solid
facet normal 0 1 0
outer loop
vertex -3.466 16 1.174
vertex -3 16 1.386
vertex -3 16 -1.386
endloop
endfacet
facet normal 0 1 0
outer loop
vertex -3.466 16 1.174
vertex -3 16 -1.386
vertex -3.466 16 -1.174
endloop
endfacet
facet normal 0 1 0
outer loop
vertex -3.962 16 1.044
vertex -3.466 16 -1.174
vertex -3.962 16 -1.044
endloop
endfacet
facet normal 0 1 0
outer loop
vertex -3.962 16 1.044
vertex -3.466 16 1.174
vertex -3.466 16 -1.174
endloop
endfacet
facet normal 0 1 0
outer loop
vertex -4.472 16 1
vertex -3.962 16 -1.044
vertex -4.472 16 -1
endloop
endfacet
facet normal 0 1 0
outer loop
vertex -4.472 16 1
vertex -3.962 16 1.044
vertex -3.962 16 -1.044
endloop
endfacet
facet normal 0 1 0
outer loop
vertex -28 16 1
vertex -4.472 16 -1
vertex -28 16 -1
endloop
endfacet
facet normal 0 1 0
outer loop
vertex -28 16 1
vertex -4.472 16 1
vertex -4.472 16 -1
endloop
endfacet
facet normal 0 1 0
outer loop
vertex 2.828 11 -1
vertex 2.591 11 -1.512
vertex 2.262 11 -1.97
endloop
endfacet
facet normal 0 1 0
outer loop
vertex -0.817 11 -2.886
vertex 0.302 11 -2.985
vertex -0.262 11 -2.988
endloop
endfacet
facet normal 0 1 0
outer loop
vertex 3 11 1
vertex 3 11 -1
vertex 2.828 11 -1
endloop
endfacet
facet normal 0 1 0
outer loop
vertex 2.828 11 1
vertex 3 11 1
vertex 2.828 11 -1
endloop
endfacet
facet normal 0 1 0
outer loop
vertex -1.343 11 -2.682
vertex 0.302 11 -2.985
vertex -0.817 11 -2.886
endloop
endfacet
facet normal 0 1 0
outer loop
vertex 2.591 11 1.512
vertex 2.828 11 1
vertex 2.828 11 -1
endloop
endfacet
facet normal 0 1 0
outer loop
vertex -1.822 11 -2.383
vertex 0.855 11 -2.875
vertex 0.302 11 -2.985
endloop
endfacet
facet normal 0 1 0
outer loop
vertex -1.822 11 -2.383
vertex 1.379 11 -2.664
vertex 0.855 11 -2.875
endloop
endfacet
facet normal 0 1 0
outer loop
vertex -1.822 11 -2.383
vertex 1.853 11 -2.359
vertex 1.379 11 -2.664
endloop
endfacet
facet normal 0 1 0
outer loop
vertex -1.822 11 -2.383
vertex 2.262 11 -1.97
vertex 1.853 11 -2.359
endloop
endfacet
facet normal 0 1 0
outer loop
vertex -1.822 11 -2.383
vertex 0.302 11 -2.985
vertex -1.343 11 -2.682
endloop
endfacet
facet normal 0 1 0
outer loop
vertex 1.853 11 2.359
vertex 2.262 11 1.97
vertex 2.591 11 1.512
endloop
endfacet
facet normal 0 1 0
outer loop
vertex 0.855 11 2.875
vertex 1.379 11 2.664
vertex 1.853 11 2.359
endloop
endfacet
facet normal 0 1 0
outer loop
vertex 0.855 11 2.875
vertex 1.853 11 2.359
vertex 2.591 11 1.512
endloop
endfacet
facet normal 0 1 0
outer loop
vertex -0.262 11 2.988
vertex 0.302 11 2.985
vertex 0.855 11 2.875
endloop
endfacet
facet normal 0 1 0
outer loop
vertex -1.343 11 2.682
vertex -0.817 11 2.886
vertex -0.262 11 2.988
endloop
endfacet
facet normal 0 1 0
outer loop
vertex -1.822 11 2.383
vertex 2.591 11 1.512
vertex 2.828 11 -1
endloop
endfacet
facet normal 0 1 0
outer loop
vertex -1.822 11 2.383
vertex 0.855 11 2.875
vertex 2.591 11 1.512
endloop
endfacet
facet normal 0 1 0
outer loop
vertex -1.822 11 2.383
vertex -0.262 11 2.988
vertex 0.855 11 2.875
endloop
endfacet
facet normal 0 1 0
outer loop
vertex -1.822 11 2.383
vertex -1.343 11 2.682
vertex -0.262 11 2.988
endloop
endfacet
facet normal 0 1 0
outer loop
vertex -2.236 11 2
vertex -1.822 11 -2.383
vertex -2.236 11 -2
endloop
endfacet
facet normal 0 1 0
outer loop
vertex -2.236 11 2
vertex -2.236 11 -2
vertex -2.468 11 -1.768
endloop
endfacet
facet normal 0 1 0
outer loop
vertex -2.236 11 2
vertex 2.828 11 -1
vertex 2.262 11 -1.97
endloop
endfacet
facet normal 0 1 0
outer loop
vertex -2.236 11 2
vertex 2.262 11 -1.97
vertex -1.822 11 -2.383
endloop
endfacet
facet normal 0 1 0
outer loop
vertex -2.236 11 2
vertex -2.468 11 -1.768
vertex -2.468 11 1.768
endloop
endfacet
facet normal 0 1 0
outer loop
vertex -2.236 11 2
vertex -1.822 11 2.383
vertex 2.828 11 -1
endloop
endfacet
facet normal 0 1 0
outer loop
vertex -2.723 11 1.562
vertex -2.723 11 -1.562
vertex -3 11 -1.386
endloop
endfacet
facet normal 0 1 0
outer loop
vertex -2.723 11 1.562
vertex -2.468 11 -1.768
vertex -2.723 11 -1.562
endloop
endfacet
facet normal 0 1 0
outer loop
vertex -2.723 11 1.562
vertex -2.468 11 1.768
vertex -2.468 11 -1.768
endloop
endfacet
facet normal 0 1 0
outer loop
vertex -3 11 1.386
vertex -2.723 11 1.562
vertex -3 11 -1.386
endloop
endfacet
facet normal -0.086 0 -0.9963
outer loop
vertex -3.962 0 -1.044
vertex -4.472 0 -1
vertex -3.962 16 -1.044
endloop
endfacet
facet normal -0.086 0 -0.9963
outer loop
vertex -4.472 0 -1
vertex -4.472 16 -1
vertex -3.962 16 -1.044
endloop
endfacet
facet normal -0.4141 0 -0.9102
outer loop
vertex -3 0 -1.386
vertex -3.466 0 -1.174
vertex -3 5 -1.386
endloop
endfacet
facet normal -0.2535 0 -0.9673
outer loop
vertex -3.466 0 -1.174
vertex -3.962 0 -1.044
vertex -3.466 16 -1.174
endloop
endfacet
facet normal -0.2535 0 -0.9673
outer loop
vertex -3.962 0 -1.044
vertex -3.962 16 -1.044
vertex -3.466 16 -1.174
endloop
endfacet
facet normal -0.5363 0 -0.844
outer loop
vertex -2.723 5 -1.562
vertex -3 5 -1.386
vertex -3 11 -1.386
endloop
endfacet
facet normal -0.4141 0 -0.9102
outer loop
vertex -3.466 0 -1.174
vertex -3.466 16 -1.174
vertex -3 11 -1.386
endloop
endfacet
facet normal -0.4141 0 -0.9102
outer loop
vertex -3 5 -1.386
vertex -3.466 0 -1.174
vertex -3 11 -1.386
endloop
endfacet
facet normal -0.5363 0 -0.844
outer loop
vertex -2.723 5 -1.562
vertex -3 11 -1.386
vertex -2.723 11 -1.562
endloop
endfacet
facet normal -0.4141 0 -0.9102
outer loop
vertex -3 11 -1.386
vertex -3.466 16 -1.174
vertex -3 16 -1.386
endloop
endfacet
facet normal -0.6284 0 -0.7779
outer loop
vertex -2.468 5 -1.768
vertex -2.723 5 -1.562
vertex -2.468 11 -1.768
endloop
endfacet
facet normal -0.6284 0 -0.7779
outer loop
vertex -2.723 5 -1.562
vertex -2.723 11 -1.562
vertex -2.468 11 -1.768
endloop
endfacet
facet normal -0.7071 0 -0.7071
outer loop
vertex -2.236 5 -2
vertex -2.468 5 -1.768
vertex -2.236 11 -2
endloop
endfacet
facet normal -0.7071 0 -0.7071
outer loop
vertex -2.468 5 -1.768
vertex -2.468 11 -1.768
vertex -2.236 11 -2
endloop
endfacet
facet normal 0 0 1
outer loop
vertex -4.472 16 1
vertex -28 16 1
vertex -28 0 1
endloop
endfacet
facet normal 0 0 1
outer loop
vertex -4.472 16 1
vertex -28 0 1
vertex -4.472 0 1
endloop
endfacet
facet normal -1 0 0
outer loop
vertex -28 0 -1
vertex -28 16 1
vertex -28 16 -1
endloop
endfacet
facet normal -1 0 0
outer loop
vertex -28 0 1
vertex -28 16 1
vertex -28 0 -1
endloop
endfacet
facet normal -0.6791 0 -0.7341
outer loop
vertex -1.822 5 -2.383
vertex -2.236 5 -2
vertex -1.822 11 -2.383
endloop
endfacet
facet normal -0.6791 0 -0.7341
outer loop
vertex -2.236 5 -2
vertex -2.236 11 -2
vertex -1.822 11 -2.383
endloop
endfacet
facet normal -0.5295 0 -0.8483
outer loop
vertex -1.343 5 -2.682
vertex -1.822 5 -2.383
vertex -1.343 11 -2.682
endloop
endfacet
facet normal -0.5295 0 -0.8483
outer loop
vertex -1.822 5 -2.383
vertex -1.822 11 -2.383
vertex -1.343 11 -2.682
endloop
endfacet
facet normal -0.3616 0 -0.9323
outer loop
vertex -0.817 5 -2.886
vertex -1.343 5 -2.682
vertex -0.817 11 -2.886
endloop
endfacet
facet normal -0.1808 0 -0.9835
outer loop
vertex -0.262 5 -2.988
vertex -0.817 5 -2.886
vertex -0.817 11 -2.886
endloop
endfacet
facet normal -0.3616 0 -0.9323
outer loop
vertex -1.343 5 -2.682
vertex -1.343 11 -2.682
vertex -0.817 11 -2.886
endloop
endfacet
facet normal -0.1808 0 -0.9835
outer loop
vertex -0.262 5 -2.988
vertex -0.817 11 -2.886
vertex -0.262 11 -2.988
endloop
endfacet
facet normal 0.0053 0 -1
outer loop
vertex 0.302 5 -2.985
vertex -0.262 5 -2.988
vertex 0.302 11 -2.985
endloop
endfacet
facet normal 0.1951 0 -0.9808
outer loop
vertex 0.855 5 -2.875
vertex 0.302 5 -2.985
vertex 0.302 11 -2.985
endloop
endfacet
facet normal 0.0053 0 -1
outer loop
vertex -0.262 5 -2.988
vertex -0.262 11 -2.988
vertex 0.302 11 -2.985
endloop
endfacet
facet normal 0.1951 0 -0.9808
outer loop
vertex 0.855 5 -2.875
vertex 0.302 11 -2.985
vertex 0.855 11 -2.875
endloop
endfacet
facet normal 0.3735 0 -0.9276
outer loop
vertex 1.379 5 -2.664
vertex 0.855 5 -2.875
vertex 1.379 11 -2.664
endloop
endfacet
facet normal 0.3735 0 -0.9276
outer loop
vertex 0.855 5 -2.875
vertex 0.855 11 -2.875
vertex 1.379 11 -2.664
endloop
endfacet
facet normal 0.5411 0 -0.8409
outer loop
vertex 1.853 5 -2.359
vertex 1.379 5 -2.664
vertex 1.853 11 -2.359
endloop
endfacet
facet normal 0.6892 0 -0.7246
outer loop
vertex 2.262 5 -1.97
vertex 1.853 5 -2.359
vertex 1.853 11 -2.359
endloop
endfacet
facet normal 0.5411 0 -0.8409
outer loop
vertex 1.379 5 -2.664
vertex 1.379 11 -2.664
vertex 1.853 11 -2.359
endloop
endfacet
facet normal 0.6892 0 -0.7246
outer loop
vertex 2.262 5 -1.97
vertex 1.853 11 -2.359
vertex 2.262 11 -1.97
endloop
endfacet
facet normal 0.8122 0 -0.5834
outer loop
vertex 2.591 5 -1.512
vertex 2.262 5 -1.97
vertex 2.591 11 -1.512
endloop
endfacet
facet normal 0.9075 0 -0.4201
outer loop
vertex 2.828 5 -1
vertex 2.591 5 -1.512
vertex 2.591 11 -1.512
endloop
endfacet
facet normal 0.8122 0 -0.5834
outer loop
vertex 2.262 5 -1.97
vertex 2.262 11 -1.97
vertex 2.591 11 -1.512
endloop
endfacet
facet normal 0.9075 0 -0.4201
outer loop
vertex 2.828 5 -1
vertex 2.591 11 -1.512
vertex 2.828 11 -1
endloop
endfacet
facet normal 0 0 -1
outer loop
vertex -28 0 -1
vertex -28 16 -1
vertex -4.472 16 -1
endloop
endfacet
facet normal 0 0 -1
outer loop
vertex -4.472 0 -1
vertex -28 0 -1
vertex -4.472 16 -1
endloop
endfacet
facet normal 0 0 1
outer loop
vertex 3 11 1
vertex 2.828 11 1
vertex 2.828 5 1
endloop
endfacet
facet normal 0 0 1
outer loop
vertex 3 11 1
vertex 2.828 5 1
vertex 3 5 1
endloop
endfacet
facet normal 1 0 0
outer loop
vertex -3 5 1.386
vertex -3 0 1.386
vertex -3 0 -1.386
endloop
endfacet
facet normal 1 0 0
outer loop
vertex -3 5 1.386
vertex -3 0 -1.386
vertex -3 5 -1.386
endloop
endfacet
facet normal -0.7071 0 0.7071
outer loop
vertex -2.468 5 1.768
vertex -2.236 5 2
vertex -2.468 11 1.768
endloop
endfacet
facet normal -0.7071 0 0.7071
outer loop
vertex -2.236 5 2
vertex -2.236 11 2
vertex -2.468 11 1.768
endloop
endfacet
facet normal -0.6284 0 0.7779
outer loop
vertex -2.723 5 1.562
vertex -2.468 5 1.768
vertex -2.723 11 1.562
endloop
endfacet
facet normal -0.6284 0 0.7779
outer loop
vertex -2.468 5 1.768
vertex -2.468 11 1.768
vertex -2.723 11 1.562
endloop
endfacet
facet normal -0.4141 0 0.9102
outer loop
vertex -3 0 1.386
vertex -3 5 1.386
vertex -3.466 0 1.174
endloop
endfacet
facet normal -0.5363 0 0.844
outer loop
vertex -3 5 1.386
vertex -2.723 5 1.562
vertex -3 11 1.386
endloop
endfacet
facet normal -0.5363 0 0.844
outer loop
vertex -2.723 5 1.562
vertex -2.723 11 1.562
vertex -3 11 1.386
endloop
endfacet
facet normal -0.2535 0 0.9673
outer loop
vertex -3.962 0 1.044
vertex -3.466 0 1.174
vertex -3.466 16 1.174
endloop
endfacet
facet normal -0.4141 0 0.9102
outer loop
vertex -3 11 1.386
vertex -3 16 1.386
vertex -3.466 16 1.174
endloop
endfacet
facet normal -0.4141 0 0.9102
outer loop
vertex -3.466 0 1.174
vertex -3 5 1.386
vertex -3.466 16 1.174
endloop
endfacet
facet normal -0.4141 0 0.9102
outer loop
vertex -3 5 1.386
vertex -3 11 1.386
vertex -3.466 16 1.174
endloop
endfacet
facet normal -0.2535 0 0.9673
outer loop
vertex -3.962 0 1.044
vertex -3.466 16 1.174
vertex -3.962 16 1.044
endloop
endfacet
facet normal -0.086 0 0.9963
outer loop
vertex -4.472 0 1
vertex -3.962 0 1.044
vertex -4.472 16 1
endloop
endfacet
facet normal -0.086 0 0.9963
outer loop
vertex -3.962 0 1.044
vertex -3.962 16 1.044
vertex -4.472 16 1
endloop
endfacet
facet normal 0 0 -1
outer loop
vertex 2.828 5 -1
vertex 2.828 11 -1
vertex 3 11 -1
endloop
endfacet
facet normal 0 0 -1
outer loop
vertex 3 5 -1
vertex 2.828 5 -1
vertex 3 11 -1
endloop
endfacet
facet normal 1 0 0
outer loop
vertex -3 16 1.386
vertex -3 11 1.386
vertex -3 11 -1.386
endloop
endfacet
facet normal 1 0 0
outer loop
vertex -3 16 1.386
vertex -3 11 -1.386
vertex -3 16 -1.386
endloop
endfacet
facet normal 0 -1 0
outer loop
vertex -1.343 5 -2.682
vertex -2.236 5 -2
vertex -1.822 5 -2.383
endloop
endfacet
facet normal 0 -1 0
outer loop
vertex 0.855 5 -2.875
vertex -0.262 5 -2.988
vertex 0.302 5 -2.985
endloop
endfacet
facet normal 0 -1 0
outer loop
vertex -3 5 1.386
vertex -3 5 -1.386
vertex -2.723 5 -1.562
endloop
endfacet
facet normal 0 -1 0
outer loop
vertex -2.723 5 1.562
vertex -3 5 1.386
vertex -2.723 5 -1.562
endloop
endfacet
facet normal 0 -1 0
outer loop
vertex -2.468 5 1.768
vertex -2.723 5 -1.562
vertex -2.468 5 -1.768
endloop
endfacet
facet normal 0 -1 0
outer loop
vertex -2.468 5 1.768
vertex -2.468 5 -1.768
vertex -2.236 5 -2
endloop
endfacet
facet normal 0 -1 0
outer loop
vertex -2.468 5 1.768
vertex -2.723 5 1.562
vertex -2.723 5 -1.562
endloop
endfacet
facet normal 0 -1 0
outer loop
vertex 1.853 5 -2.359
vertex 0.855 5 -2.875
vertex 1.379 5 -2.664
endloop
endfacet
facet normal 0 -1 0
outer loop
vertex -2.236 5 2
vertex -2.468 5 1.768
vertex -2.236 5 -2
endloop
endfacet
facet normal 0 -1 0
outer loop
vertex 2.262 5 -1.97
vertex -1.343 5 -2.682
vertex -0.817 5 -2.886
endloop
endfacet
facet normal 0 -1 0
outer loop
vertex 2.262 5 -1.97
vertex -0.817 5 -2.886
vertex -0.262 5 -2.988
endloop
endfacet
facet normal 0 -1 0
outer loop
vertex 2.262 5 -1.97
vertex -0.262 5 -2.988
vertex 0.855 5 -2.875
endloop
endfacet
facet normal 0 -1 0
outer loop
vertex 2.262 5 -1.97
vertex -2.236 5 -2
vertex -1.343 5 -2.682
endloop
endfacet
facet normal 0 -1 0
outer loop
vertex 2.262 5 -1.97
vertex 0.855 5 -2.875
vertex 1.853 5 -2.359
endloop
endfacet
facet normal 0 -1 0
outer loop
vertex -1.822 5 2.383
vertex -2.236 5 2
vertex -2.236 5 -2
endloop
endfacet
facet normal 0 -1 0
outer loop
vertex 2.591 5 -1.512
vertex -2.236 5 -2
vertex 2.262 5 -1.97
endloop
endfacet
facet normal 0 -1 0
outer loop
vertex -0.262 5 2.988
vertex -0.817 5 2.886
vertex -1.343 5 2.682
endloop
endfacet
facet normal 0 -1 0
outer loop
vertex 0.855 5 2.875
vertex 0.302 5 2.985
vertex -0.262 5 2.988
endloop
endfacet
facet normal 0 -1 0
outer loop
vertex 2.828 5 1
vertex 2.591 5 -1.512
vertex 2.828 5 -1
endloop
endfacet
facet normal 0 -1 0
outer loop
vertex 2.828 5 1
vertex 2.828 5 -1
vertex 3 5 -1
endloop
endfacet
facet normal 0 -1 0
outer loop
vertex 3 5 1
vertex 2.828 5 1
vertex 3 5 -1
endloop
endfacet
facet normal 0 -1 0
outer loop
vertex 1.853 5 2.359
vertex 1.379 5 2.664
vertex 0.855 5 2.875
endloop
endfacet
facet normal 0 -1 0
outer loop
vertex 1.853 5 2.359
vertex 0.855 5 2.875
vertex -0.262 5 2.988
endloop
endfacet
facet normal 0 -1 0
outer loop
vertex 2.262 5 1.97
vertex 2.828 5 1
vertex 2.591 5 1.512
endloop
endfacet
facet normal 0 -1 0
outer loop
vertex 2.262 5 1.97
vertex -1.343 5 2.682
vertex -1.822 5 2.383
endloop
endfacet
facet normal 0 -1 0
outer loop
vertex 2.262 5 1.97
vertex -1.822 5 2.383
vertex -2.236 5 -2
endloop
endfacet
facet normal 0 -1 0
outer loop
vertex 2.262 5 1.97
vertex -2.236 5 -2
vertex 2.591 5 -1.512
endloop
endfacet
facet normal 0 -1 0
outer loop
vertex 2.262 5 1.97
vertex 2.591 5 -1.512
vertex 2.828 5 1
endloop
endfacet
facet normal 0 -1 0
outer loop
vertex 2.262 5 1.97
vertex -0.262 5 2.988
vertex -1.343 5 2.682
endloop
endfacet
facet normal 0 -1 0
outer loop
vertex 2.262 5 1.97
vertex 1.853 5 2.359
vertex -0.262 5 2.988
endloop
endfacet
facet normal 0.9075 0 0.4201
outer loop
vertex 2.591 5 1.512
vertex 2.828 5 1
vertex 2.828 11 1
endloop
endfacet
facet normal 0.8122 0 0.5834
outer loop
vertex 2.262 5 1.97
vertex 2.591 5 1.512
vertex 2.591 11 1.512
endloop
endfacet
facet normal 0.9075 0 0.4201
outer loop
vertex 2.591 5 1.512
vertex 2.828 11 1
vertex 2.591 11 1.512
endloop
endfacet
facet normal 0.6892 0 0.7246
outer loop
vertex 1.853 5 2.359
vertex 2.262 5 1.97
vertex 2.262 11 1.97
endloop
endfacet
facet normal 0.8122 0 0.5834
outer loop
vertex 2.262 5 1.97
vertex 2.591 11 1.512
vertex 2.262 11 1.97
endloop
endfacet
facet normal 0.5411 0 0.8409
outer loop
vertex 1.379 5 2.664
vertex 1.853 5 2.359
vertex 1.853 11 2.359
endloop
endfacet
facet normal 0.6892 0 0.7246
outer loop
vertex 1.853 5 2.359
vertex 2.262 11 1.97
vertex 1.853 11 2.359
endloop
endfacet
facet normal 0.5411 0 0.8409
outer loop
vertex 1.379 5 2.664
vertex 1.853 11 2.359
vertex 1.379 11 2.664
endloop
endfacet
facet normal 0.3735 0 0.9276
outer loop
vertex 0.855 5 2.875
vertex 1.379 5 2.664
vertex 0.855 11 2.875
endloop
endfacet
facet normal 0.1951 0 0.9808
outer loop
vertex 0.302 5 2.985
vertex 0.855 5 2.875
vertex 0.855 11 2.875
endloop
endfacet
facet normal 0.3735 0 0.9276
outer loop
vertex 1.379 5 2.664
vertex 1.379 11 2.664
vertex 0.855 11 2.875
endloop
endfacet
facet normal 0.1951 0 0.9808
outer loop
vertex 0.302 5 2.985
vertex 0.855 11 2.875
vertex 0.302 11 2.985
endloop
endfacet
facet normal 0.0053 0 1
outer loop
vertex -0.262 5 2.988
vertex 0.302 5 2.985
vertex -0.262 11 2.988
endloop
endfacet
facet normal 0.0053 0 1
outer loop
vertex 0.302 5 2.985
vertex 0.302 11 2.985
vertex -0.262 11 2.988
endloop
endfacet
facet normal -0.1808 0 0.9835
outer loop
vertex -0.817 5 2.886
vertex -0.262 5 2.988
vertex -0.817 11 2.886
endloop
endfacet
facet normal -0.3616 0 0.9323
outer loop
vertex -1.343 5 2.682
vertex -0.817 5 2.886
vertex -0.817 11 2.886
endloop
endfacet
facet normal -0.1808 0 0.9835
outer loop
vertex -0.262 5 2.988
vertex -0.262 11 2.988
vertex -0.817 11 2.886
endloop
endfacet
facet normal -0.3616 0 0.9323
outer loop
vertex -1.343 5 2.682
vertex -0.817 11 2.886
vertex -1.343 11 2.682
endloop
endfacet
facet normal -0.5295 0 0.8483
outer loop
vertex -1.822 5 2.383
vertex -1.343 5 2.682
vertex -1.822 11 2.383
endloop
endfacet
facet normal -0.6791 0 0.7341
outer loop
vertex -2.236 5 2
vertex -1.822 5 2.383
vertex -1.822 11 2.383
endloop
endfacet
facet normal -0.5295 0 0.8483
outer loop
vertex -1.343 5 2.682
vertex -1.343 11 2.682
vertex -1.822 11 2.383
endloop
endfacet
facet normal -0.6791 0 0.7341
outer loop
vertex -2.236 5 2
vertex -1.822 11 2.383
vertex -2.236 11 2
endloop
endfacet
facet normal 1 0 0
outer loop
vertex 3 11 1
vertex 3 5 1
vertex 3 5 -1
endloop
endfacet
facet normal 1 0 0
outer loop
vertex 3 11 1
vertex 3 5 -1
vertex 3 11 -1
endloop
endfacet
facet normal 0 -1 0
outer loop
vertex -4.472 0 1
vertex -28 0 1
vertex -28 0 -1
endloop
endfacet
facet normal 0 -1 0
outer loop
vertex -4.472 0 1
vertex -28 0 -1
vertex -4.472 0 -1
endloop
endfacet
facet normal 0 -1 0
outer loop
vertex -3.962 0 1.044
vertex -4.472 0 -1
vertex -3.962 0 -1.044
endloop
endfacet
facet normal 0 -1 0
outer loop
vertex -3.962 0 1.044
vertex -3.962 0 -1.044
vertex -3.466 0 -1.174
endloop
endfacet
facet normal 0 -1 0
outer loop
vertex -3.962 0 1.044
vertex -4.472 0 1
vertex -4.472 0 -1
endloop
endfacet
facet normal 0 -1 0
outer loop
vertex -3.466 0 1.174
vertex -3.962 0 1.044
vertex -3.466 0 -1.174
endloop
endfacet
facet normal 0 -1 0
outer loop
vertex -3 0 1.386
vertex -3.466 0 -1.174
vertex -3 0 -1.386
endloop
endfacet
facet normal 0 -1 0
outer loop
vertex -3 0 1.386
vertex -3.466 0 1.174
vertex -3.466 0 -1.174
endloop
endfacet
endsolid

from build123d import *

# Parameters (mm, degrees)
F0_W     = 3
F0_H     = 6
F3_DEPTH = 1
F4_D     = 1
F6_R     = 3


with BuildPart() as f2:
    # F0 (on Top) → F2 (revolve)
    with BuildSketch(Plane.XY):
        with Locations((1.5, 8)):
            Rectangle(F0_W, F0_H)
    revolve(axis=Axis((0, 8, 0), (0, -1, 0)))

    # F4 (through all)
    with Locations(Plane.XZ):
        with Locations((0, 0)):
            Hole(F4_D / 2)


with BuildPart() as f3:
    # F0 (on Top) → F3 (new body, symmetric)
    with BuildSketch(Plane.XY):
        Polygon((-28, 16), (-28, 0), (-3, 0), (-3, 5), (0, 5), (0, 11), (-3, 11), (-3, 16), align=None)
        with Locations((1.5, 8)):
            Rectangle(F0_W, F0_H)
    extrude(amount=F3_DEPTH, both=True)


with BuildPart() as f2_1:
    add(f2.part)

    # F5: union F3
    add(f3.part)

    # F6 (call 1 of 2: OpenCascade refuses the feature's edges together)
    f6_edges = [f2_1.edges().sort_by_distance(p)[0] for p in [
        (-2.828427, 8, 1),
    ]]
    fillet(f6_edges, radius=F6_R)

    # F6#2 (call 2 of 2)
    f6_2_edges = [f2_1.edges().sort_by_distance(p)[0] for p in [
        (-2.828427, 8, -1),
    ]]
    fillet(f6_2_edges, radius=F6_R)


solid = f2_1.part
